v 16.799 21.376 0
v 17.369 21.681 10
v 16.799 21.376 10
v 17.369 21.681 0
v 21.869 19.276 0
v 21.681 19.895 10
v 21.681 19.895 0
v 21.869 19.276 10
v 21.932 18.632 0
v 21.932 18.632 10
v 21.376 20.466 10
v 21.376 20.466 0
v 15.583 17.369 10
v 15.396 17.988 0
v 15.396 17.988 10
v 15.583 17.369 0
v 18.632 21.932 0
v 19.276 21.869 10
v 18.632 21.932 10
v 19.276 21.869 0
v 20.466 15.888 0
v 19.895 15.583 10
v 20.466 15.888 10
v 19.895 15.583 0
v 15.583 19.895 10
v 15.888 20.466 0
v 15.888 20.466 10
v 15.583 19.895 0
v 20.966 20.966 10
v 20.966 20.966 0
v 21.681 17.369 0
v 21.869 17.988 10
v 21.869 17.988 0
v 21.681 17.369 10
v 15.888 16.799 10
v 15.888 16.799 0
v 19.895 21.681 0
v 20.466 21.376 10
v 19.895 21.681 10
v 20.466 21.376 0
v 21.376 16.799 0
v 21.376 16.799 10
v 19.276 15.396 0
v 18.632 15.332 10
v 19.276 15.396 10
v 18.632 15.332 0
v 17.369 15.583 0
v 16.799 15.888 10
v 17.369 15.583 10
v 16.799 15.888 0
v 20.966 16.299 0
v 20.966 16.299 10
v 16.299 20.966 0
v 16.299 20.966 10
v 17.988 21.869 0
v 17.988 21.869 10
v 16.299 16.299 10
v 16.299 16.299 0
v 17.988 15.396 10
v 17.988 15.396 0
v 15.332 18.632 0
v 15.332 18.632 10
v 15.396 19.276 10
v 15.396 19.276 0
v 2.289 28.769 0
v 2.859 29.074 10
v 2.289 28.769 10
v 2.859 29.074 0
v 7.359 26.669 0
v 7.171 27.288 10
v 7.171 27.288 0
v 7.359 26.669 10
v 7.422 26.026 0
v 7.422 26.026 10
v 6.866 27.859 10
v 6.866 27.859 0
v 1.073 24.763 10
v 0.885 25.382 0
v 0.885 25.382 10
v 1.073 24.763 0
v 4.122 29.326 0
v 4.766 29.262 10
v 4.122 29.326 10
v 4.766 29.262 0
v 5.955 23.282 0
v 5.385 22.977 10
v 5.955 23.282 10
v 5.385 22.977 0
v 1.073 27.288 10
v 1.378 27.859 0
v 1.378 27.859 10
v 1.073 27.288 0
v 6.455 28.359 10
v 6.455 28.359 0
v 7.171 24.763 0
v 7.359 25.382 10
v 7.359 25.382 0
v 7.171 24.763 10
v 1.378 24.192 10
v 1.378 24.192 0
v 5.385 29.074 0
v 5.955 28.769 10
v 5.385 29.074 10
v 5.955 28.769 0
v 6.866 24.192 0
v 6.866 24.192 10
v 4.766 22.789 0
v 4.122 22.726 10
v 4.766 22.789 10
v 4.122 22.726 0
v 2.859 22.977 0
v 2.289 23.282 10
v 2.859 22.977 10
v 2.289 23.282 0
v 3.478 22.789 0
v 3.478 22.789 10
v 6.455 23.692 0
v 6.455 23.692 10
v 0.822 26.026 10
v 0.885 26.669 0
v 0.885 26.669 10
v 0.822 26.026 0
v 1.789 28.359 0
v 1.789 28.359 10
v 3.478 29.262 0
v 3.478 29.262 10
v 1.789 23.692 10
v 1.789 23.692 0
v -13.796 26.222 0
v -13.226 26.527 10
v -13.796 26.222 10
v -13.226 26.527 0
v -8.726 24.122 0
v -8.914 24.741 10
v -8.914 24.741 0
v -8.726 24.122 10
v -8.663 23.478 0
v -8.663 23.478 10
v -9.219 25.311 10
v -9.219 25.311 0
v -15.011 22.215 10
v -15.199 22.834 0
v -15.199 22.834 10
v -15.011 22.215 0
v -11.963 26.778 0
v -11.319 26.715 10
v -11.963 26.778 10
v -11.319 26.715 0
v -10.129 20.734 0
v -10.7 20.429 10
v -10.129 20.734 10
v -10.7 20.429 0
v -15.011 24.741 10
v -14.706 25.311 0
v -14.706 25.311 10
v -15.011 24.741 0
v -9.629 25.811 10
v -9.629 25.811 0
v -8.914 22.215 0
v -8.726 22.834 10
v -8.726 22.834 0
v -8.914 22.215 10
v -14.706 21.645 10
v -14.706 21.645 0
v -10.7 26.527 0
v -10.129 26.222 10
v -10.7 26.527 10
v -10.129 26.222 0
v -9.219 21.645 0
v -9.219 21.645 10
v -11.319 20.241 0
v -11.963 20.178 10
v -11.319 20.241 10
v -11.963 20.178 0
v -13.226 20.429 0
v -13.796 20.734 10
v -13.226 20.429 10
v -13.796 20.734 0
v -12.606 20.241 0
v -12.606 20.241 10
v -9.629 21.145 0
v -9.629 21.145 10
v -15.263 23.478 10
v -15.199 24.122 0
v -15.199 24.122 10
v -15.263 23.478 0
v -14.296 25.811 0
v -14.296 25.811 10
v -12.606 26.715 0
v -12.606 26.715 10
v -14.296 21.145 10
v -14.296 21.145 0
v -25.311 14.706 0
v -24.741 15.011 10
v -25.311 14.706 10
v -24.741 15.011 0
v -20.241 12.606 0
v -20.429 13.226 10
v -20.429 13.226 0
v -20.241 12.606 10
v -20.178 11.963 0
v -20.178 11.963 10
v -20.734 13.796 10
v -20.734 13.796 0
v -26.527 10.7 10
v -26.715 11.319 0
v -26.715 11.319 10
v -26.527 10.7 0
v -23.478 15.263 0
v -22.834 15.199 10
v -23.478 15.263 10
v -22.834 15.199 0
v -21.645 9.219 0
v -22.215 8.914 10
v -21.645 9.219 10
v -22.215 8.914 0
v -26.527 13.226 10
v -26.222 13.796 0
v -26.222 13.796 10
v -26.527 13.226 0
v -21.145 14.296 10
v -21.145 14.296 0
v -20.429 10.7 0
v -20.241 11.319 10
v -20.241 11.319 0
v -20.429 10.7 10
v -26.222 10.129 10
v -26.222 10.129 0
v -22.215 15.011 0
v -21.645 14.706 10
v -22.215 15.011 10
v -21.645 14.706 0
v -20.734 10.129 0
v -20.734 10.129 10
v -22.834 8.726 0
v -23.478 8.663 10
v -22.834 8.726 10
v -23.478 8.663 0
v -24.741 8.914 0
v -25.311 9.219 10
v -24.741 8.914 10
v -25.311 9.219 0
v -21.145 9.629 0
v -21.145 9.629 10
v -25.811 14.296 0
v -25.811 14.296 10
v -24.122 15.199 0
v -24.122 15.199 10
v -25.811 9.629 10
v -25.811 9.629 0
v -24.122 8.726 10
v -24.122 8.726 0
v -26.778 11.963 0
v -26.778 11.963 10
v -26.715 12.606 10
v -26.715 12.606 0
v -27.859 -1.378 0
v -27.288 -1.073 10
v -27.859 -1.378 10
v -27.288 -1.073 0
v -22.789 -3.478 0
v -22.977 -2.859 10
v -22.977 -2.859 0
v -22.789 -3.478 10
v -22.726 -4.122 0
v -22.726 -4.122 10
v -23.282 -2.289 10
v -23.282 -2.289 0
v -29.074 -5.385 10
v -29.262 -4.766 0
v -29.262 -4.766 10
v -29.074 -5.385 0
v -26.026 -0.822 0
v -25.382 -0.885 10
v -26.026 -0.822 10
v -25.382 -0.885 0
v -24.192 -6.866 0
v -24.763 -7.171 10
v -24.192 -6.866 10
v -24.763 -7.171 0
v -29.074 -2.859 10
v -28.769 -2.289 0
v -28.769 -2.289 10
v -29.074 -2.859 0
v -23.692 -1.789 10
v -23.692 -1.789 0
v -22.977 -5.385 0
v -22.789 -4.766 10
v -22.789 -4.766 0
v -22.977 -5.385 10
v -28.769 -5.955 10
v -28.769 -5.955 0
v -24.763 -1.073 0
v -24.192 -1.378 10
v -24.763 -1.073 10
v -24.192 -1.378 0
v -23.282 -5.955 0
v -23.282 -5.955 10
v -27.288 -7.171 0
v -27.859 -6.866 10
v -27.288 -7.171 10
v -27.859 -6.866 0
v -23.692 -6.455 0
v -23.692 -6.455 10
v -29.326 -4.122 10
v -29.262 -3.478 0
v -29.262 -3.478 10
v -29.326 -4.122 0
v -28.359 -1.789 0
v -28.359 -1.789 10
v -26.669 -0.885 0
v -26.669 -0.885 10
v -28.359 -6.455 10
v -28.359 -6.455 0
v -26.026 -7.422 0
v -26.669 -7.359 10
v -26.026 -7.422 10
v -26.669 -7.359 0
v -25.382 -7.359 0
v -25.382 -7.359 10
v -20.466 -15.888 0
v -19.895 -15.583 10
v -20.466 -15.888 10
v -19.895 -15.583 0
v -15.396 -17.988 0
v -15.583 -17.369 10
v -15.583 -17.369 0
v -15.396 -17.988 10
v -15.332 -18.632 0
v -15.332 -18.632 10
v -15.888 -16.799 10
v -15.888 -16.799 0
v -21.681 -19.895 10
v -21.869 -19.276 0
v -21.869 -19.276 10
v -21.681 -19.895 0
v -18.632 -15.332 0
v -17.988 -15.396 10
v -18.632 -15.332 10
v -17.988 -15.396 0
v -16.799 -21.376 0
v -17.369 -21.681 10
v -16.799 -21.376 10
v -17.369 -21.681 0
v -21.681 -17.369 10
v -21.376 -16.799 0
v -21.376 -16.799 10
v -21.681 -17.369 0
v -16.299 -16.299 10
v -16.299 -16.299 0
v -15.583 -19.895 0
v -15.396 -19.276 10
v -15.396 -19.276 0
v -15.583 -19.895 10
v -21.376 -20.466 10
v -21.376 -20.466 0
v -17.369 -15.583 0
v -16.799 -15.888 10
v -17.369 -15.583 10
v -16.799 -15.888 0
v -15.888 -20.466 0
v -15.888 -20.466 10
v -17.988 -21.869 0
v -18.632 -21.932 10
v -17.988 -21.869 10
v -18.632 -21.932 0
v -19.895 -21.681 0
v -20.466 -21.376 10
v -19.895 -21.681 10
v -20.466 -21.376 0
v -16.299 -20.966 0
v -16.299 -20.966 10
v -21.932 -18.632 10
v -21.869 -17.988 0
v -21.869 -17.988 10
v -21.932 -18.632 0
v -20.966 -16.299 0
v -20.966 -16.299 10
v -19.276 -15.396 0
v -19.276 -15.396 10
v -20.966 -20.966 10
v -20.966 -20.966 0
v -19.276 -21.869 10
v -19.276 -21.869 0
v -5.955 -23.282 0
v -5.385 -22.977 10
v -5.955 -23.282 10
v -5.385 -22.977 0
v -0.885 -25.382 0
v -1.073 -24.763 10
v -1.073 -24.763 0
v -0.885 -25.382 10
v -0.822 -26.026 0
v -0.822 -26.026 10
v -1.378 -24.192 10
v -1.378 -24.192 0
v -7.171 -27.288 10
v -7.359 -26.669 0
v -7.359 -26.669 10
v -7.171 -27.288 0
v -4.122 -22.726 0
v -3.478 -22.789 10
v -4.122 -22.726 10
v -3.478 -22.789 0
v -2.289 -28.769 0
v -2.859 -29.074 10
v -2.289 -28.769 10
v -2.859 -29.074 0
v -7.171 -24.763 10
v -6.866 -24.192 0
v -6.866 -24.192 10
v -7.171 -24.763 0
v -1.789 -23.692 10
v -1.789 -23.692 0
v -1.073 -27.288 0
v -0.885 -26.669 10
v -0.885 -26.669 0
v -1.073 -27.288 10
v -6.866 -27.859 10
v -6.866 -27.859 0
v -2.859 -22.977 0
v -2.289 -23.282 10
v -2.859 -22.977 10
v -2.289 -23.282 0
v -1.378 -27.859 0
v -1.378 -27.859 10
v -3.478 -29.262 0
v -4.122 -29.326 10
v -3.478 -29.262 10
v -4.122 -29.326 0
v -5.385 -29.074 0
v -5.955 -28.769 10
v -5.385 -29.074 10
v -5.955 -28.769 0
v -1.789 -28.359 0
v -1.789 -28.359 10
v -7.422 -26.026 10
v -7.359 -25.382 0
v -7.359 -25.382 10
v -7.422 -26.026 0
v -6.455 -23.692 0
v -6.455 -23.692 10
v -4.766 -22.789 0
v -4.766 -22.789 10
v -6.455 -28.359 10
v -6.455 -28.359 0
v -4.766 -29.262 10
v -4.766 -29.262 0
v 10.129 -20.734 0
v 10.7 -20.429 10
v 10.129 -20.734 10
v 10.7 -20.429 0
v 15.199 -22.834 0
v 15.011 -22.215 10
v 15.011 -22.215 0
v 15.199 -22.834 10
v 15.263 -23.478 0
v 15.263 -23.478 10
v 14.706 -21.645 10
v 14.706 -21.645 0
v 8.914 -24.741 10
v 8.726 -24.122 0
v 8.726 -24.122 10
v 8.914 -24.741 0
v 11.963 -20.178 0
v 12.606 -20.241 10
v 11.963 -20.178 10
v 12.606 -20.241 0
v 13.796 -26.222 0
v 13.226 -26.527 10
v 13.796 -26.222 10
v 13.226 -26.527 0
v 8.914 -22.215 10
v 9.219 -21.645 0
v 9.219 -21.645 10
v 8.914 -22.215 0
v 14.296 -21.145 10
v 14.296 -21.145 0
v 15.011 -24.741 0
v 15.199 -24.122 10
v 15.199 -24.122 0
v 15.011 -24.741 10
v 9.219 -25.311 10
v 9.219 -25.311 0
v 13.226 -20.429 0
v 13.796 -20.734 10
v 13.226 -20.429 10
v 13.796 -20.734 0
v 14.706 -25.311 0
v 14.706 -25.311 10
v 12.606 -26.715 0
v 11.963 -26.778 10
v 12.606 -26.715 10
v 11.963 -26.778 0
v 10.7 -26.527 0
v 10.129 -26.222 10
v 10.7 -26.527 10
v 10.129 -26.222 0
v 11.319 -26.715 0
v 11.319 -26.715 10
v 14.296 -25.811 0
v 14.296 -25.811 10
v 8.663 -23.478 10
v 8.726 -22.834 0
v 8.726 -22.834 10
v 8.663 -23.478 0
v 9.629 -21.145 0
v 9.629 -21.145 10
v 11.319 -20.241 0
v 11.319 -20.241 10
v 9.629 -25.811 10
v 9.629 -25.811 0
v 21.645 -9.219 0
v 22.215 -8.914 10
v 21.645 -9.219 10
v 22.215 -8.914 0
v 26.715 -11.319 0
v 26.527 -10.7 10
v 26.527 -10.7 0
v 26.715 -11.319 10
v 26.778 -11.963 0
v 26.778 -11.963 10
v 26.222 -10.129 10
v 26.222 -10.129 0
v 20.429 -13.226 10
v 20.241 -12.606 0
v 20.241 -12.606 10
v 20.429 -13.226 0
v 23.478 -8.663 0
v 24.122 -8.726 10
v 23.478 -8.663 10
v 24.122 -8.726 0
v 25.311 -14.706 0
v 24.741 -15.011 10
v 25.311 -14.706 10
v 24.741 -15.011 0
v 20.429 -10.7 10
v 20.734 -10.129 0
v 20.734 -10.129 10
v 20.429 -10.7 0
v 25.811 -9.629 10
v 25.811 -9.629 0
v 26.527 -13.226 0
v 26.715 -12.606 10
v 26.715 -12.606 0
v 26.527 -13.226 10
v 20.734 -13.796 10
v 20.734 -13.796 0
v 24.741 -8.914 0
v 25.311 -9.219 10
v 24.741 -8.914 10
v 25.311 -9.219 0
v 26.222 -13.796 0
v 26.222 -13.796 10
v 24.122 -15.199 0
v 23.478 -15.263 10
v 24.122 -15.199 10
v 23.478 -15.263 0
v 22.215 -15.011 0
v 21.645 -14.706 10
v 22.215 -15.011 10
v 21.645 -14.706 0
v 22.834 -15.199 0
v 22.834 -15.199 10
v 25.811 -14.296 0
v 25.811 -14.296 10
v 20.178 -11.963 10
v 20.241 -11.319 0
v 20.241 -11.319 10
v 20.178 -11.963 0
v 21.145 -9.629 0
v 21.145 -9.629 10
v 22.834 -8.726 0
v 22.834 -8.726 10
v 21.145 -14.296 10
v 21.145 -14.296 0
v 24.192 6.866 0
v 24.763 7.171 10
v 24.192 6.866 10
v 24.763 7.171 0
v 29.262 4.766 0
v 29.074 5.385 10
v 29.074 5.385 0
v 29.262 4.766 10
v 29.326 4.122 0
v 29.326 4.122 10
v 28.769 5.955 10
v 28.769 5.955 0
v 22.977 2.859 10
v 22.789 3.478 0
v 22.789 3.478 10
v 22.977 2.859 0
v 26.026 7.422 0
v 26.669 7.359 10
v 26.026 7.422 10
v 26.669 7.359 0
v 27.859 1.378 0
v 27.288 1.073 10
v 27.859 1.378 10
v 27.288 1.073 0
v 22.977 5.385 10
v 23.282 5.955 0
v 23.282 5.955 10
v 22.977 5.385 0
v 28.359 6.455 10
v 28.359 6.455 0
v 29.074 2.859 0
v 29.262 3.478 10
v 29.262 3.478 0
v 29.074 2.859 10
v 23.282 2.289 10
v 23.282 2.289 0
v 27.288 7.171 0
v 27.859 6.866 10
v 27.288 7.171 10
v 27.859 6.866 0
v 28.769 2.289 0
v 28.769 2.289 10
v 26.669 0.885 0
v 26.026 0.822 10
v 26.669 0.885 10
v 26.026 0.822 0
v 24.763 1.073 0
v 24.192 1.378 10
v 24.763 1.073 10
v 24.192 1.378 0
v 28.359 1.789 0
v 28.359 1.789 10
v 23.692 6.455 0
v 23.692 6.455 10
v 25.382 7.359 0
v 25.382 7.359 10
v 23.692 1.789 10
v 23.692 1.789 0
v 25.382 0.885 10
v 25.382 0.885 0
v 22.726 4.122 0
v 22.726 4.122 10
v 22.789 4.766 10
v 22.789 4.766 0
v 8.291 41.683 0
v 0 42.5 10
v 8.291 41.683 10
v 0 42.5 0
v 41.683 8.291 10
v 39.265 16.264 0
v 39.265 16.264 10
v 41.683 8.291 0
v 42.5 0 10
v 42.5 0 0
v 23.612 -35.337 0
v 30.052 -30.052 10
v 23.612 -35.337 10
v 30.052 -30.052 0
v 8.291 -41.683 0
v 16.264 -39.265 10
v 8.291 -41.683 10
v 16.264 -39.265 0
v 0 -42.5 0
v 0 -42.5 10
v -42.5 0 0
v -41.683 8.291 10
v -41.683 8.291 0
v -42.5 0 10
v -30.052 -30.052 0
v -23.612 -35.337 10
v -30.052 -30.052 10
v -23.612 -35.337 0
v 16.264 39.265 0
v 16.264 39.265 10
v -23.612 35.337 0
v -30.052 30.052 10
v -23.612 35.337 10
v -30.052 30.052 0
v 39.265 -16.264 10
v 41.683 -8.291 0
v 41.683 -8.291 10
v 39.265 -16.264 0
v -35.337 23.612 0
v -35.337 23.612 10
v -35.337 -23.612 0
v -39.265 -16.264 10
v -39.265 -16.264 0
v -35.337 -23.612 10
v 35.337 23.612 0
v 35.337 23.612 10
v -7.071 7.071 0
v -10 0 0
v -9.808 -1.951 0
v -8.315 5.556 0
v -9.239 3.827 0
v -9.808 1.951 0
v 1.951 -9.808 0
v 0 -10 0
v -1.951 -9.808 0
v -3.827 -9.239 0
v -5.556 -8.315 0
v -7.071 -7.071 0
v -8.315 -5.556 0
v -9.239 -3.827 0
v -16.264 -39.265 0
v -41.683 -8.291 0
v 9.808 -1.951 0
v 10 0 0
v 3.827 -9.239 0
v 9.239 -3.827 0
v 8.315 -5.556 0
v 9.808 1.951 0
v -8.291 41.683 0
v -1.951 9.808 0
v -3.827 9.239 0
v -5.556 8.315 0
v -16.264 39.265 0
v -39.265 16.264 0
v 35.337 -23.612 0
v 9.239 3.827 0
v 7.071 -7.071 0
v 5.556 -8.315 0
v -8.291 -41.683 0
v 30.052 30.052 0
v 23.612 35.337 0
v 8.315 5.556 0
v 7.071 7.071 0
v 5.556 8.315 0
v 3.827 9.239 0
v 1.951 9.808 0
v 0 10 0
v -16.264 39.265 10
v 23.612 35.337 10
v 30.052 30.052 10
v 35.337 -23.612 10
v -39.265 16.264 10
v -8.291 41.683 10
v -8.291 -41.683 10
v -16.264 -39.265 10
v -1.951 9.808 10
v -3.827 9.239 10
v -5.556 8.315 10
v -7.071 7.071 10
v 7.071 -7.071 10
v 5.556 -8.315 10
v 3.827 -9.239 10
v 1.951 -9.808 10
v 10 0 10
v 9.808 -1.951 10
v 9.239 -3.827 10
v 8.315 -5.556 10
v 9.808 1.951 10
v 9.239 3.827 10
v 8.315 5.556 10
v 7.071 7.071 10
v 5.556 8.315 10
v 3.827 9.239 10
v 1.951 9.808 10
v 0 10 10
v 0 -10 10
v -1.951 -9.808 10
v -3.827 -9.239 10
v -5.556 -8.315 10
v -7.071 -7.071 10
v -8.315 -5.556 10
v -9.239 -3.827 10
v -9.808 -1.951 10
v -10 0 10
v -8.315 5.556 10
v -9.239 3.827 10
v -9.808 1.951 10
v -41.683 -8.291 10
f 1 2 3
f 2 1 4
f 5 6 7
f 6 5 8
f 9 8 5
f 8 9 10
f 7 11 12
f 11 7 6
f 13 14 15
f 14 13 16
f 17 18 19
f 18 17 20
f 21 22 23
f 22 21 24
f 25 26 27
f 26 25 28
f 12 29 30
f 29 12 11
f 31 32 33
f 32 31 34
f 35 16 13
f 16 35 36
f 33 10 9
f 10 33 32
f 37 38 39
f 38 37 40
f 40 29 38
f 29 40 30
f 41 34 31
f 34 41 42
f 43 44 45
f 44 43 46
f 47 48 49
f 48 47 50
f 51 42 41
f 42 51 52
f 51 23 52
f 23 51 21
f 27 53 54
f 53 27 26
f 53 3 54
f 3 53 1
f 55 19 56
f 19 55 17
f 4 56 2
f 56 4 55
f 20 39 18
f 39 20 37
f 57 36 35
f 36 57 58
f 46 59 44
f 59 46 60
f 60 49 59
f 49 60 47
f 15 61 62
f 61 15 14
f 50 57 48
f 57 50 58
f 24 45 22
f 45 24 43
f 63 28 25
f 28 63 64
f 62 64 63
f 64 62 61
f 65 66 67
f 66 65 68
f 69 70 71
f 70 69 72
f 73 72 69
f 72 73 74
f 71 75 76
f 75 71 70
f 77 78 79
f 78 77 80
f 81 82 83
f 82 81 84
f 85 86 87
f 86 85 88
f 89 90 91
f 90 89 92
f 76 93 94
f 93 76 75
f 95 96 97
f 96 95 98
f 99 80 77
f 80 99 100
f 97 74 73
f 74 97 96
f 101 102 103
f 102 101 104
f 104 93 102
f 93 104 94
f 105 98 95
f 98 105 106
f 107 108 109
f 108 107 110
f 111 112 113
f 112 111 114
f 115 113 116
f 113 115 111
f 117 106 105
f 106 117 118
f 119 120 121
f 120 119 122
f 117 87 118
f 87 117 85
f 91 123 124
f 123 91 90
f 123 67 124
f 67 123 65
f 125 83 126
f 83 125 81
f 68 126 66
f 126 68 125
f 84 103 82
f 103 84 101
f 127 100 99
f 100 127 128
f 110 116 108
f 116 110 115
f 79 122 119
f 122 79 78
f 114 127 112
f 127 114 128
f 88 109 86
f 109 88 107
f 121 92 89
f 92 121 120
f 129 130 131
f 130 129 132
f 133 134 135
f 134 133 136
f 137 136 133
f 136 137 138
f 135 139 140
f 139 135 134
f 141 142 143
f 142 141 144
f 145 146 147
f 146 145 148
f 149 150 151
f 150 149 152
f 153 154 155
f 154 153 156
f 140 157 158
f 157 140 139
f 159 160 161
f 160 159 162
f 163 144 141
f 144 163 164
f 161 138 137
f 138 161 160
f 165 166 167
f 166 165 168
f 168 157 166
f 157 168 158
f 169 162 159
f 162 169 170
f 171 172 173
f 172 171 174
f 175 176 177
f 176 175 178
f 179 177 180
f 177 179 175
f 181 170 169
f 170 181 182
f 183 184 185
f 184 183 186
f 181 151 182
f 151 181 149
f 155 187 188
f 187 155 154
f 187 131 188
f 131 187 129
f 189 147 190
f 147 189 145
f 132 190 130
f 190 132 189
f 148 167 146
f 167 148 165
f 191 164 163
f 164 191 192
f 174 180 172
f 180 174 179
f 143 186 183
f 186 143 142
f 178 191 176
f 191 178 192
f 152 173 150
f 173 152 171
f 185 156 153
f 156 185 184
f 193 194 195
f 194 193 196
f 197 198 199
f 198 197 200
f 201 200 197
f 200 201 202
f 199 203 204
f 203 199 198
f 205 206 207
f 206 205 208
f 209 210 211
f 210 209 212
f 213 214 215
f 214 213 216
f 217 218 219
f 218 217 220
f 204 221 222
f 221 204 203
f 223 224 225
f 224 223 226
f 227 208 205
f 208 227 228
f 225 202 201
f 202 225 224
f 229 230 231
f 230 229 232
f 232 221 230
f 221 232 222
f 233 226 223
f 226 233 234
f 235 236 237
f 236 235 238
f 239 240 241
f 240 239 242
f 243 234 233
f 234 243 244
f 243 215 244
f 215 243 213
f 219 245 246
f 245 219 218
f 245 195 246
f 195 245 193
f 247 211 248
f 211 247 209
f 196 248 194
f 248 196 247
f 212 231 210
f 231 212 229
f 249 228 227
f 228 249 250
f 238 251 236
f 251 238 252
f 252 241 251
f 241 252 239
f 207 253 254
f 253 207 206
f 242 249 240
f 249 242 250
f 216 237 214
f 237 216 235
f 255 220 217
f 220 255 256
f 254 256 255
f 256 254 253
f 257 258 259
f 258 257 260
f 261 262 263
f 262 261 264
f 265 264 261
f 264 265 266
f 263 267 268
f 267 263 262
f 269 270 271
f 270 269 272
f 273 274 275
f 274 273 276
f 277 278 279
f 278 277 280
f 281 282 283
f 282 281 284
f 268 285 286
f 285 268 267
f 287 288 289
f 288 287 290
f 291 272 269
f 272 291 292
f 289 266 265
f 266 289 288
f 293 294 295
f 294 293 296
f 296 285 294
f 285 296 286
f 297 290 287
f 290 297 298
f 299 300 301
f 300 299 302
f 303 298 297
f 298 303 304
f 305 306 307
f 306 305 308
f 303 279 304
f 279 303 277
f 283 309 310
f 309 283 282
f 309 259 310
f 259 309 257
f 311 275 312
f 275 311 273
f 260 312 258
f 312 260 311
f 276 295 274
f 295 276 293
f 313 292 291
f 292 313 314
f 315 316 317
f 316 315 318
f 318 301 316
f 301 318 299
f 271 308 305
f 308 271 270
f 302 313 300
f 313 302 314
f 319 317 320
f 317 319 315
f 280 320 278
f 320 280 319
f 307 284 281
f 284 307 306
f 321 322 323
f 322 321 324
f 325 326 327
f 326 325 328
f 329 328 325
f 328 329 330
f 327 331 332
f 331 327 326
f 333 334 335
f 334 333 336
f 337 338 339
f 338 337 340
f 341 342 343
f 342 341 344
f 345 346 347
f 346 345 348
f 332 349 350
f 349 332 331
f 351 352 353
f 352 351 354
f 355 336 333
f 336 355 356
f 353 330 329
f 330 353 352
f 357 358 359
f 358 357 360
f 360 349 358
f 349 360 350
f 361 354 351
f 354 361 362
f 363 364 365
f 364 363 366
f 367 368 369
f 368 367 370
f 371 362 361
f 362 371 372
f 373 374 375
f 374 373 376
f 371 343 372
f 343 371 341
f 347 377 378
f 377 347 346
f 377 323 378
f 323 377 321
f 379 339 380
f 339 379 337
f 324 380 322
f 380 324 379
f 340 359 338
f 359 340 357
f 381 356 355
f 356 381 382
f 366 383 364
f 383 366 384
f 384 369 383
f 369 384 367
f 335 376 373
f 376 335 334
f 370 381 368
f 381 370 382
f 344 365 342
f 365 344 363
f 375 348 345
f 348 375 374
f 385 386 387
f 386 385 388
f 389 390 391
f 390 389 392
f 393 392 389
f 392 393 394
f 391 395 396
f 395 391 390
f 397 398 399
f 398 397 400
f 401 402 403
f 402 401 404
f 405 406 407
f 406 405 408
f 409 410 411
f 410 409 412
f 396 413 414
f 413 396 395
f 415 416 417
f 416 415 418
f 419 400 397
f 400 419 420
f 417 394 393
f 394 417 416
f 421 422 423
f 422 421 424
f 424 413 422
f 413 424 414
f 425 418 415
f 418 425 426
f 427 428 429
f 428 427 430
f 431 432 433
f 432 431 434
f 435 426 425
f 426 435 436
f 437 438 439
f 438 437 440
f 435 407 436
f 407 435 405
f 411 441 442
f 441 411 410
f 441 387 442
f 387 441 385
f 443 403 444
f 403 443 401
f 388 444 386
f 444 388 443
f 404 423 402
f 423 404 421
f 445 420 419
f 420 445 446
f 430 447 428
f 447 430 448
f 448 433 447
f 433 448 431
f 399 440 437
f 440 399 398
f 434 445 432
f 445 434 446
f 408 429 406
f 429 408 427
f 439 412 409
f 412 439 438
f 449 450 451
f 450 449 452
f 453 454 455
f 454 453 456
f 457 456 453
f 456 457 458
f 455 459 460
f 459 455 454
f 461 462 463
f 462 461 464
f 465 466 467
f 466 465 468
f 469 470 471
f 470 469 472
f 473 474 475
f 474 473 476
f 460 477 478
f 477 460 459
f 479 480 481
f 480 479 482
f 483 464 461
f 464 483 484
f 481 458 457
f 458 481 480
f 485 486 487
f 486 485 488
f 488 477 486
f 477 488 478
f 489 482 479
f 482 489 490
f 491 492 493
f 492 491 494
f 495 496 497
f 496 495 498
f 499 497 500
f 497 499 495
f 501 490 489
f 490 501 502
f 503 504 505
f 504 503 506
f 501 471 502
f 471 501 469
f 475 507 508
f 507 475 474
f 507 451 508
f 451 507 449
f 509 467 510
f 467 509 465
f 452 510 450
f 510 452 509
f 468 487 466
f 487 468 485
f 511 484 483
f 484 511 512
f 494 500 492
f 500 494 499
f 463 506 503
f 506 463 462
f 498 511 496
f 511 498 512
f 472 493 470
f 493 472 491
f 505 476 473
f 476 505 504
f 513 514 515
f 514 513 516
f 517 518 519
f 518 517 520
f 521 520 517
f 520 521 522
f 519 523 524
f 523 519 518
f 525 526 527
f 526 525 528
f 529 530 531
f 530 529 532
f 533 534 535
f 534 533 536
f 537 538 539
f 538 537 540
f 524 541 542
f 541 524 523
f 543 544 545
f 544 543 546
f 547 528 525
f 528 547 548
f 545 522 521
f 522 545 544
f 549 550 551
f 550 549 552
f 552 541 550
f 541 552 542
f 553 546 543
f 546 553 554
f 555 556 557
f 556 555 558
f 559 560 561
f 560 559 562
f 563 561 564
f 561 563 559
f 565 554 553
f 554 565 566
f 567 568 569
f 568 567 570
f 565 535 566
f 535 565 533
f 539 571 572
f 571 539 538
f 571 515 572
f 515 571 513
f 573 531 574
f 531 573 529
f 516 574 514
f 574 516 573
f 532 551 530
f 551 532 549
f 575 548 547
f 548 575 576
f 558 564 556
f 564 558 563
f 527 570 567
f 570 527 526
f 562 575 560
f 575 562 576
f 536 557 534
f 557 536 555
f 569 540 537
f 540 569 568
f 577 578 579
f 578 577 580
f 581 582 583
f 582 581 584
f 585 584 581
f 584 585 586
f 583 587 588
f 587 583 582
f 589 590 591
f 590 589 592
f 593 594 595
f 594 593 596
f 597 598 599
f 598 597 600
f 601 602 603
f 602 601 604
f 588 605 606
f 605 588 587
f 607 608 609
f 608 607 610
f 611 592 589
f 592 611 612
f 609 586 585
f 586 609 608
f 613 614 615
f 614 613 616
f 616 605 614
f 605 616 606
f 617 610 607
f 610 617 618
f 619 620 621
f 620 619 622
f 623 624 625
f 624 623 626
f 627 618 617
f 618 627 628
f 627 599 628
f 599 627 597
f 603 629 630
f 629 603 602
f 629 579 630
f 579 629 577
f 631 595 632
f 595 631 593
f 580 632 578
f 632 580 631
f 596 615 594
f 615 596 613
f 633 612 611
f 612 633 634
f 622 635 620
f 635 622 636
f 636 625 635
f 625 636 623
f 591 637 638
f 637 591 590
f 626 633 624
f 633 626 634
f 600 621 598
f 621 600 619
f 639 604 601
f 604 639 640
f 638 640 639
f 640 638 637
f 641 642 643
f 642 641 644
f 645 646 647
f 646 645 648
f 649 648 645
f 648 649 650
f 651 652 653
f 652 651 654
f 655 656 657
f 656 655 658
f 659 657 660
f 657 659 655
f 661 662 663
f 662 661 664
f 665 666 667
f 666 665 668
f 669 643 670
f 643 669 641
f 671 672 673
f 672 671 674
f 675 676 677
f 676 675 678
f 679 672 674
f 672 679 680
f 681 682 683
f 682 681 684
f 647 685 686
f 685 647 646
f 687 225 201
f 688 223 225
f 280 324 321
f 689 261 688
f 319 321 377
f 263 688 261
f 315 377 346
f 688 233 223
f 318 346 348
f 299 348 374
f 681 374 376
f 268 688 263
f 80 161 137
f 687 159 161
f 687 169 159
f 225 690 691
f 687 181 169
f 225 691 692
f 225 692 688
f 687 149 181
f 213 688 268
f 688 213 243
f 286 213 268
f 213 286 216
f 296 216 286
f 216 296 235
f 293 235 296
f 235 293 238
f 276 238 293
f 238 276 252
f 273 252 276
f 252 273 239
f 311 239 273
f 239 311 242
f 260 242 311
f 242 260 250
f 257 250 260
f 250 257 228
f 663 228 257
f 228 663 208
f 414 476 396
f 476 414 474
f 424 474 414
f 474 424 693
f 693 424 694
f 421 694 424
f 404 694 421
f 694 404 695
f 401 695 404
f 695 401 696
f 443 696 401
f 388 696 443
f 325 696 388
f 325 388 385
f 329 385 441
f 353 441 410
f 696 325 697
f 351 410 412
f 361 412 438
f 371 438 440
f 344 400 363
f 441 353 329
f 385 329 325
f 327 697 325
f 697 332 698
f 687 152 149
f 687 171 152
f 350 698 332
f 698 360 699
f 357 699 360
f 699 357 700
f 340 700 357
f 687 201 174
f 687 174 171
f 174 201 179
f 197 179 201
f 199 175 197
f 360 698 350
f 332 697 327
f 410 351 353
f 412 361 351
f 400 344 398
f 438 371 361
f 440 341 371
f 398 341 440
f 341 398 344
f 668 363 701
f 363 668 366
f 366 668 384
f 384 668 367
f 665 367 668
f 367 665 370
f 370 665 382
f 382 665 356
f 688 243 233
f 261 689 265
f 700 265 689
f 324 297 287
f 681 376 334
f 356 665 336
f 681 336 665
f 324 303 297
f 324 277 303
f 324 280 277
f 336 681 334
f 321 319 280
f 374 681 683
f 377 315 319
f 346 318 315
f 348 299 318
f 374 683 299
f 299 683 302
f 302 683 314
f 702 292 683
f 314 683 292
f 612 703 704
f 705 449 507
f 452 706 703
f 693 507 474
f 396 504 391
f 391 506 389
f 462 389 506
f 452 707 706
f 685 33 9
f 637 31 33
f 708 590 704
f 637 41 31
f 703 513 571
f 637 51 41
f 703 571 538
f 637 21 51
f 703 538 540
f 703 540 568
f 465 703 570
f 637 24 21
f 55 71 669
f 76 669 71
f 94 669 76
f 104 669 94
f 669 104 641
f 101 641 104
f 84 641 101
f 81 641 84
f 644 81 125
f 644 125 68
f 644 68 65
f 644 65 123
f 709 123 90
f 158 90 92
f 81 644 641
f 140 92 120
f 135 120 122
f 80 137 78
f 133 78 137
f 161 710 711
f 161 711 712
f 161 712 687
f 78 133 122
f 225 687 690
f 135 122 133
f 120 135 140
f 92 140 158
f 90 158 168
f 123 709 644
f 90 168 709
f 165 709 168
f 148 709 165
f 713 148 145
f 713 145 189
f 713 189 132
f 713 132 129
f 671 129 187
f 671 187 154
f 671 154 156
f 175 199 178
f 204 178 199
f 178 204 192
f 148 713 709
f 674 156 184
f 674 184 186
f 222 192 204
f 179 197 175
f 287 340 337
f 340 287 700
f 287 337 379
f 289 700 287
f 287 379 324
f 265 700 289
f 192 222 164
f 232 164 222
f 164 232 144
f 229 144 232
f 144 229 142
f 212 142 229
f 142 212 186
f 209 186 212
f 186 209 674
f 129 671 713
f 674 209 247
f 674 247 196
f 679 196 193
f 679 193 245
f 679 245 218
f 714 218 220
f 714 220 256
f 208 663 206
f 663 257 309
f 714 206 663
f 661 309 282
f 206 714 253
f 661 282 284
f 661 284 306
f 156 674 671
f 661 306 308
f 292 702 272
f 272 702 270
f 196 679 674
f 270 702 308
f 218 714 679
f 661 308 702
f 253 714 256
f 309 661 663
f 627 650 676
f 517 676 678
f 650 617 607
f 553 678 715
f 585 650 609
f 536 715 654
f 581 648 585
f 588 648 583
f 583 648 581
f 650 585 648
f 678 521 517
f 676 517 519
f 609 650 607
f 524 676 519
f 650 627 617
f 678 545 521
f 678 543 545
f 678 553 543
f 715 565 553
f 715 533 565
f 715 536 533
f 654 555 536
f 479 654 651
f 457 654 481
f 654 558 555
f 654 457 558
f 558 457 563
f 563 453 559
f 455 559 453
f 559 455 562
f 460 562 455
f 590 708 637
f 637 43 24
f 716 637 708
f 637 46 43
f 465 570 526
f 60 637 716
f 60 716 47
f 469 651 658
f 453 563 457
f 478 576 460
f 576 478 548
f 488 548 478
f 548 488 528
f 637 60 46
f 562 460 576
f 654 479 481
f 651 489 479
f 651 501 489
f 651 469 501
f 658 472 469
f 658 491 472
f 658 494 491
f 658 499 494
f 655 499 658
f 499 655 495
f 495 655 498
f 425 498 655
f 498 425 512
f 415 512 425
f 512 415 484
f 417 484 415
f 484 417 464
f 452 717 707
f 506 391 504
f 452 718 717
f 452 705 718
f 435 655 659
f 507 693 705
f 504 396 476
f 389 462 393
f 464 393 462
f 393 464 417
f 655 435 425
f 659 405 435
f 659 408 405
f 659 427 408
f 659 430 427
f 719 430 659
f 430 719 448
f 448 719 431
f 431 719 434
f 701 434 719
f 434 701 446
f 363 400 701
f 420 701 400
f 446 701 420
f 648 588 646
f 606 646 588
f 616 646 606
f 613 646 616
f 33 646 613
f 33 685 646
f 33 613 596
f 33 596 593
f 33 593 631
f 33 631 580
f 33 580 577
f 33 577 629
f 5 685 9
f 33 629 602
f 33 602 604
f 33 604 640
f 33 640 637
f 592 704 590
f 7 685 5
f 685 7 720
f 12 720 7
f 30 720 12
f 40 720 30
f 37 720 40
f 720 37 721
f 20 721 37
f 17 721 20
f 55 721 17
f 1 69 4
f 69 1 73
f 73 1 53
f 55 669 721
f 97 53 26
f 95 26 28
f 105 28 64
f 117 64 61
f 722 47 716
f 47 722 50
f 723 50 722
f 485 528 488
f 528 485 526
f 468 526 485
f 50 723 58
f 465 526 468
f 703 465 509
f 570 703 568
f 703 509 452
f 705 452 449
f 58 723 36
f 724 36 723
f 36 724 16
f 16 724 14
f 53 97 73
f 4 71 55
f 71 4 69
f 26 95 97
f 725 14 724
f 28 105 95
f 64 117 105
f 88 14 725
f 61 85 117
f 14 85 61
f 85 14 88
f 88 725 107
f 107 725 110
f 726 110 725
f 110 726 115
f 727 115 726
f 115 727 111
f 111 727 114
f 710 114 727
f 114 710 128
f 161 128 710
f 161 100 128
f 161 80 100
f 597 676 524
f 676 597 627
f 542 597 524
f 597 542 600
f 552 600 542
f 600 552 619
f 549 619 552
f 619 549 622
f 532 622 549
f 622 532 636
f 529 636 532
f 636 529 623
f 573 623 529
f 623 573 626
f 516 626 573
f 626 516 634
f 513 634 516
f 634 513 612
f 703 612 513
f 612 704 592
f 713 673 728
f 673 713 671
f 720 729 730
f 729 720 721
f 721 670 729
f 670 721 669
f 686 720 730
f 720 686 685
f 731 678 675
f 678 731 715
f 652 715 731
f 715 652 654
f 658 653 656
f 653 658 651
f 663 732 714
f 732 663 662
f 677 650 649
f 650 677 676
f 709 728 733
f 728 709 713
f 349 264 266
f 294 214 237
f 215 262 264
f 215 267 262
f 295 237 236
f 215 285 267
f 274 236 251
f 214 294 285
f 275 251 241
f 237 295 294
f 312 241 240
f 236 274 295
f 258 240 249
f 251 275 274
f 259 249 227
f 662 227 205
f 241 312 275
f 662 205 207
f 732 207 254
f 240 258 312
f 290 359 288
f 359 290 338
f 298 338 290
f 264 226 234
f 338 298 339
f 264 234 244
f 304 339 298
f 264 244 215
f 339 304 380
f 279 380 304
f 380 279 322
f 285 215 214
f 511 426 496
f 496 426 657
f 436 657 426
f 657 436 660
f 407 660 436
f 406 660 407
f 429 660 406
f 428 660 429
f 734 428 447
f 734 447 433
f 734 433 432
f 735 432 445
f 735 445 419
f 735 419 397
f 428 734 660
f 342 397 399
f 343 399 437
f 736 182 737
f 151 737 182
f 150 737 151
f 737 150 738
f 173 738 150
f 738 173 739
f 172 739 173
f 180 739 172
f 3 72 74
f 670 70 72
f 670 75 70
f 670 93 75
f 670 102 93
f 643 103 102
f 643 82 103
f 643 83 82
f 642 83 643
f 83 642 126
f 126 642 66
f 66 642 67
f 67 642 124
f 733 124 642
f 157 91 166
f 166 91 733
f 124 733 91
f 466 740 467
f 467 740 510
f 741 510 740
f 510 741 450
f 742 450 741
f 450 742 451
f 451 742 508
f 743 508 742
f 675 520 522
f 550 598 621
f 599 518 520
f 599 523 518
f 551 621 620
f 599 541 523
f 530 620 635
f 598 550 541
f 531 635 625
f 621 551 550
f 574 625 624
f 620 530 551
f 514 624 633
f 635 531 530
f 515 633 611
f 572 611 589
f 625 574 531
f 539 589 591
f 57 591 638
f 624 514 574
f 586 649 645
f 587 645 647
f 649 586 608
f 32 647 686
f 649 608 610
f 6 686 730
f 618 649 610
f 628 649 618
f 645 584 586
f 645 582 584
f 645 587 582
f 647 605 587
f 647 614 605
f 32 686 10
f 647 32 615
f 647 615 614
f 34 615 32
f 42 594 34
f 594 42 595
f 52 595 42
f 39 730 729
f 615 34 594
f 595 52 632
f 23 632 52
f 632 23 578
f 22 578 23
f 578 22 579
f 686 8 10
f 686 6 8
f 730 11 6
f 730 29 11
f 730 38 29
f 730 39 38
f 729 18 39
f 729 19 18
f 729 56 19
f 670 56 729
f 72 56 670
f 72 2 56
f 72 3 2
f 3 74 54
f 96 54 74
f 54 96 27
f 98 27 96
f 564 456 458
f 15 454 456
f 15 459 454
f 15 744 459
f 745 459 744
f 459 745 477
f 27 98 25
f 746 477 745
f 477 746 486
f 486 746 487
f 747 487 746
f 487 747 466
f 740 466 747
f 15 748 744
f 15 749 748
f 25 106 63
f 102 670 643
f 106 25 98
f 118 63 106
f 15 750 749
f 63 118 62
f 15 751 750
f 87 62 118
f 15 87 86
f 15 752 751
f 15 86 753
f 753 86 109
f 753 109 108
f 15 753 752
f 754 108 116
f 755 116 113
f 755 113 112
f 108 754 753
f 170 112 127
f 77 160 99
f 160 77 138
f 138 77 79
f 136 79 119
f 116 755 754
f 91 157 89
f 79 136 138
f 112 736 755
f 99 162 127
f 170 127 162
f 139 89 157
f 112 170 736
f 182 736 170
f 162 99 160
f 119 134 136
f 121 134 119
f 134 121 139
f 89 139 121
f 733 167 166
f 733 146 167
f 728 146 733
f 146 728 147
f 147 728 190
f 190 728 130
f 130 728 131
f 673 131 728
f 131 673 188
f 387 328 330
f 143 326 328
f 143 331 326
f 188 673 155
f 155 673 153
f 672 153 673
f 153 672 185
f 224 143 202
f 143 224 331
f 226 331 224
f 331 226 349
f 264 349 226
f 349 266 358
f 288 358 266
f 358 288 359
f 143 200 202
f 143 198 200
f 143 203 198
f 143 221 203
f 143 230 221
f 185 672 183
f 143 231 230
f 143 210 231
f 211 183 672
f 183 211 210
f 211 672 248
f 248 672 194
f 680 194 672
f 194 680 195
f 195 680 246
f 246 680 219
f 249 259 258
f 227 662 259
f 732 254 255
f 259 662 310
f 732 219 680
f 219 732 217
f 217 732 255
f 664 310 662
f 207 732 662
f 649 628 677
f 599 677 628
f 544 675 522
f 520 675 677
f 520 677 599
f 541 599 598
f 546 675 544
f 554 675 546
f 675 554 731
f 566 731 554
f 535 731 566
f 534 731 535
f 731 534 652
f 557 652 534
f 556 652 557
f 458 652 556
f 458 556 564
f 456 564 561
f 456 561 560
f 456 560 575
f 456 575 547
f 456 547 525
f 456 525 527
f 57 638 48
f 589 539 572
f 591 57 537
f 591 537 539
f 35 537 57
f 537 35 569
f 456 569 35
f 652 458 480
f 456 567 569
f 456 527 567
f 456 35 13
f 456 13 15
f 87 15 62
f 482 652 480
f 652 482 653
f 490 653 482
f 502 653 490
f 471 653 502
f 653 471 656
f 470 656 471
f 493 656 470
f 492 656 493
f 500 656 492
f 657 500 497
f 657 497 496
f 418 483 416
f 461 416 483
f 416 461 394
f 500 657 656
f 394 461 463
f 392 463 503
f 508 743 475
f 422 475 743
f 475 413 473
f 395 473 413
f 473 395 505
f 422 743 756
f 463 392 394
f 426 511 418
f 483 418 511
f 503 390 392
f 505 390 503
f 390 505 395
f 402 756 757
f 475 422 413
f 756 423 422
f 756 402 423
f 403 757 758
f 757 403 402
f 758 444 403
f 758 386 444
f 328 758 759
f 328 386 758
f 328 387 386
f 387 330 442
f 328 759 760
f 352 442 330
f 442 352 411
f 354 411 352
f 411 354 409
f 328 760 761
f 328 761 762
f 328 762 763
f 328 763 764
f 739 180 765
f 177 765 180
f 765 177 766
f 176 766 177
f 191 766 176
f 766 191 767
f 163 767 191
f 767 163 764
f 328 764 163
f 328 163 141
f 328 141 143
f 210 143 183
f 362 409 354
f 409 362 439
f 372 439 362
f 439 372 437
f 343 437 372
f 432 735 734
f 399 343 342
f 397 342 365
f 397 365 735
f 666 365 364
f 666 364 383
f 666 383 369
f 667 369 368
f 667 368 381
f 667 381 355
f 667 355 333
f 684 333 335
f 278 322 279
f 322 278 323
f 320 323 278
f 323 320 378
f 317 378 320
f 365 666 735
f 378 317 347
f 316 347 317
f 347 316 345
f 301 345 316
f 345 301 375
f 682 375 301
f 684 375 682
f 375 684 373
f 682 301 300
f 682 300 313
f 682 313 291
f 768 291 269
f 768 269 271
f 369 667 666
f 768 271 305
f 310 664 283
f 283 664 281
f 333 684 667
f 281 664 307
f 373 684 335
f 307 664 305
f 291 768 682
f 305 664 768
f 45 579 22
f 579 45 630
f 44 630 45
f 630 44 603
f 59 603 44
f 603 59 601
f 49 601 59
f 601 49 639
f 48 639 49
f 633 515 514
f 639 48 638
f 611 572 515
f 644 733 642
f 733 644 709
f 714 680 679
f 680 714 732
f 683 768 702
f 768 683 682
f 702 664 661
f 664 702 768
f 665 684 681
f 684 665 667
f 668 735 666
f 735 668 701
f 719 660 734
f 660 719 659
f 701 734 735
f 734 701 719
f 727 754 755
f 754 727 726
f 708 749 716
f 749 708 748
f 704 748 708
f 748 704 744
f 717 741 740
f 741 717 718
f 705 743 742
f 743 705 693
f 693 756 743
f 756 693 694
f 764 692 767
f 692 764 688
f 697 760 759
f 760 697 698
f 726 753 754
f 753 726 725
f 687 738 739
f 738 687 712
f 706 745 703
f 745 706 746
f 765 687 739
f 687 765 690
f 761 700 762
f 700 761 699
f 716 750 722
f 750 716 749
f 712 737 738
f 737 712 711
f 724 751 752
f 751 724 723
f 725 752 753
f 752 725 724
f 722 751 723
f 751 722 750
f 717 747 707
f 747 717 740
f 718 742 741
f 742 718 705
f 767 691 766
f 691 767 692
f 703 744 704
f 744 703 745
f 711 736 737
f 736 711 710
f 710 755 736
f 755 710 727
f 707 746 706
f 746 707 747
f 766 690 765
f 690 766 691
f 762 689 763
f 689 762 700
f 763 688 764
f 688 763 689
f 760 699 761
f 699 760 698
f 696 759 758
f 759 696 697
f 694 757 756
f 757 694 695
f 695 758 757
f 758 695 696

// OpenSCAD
$fn = 32;

// ----------------------------------------------------------------------
// Flange Ø85 x 10
// 10 holes on a Ø52.7 bolt circle, bolted joints
// ----------------------------------------------------------------------

// --- parameters (mm) ---
flange_d = 85;   // outside diameter of the flange
thickness = 10;  // flange thickness
holes = 10;      // number of bolt holes
pcd = 52.7;      // bolt circle diameter
start_deg = 45;  // angle of the first hole, from +X
hole_d = 6.6;    // bolt hole diameter
bore_d = 20;     // central through bore
hub_d = 30;      // hub outside diameter
hub_h = 0;       // hub height above the flange face (0 = no hub)

// --- derived feature positions (mm) ---
height = thickness + hub_h;  // = 10   overall height of the part
pcd_r = pcd / 2;             // = 26.35   bolt circle radius
hole_step = 360 / holes;     // = 36   angular pitch
feature_centers = [
  [pcd_r * cos(start_deg + 0 * hole_step), pcd_r * sin(start_deg + 0 * hole_step)],
  [pcd_r * cos(start_deg + 1 * hole_step), pcd_r * sin(start_deg + 1 * hole_step)],
  [pcd_r * cos(start_deg + 2 * hole_step), pcd_r * sin(start_deg + 2 * hole_step)],
  [pcd_r * cos(start_deg + 3 * hole_step), pcd_r * sin(start_deg + 3 * hole_step)],
  [pcd_r * cos(start_deg + 4 * hole_step), pcd_r * sin(start_deg + 4 * hole_step)],
  [pcd_r * cos(start_deg + 5 * hole_step), pcd_r * sin(start_deg + 5 * hole_step)],
  [pcd_r * cos(start_deg + 6 * hole_step), pcd_r * sin(start_deg + 6 * hole_step)],
  [pcd_r * cos(start_deg + 7 * hole_step), pcd_r * sin(start_deg + 7 * hole_step)],
  [pcd_r * cos(start_deg + 8 * hole_step), pcd_r * sin(start_deg + 8 * hole_step)],
  [pcd_r * cos(start_deg + 9 * hole_step), pcd_r * sin(start_deg + 9 * hole_step)]
];   // bolt hole centres on the pitch circle

// flange disc, every hole and the bore cut straight through
difference() {
  union() {
    cylinder(d = flange_d, h = thickness);
  }
  translate([0, 0, -1]) cylinder(d = bore_d, h = height + 2);  // bore, through
  for (centre = feature_centers)
    translate([centre[0], centre[1], -1]) cylinder(d = hole_d, h = thickness + 2);
}
